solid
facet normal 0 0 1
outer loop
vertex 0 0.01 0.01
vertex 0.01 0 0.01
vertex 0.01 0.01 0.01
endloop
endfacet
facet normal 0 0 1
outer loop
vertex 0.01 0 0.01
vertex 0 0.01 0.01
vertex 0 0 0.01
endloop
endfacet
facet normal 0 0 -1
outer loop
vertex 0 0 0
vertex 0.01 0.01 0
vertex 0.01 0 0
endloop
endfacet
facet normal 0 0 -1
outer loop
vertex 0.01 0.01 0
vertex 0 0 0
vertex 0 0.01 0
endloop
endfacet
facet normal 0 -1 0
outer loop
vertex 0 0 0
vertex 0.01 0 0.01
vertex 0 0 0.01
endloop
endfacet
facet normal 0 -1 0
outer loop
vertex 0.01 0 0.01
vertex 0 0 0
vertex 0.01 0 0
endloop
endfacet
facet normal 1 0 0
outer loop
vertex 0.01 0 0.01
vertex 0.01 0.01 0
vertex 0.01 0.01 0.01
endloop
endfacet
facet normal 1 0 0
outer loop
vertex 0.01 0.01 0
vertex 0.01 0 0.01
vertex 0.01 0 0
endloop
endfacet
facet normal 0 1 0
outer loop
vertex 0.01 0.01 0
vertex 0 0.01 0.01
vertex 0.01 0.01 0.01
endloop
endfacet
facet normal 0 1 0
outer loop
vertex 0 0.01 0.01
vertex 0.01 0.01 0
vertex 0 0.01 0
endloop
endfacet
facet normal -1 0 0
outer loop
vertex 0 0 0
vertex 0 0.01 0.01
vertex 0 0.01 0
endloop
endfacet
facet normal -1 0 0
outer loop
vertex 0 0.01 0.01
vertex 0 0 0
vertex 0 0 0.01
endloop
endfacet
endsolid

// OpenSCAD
/***
 * @function superformula_shape_policy
 * @brief Preserve perimeter scaling and the fixed 720-sample solver-bound policy.
 * Source: [`superformula/shape_policy.scad`](superformula/shape_policy.scad)
 */
include <../../src/superformula/mate.scad>
for(n=[120,360,960],m=[4,6]) {
    scale=_cg_superformula_scale(.8,34,m,1,1,2.4,3.4,3.4,n);
    shape=_cg_superformula_shape(.8,34,m,1,1,2.4,3.4,3.4,n);
    mx=_cg_superformula_max_radius(scale,m,1,1,2.4,3.4,3.4,720);
    expected=_cg_superformula_points(scale,m,1,1,2.4,3.4,3.4,n);
    assert(max([for(i=[0:n-1]) _cg_vlen(_cg_vsub(shape[0][i],expected[i]))])<1e-10,"superformula polygon changed");
    assert(abs(shape[2]-(mx+.01))<1e-10 && abs(shape[3]-4*mx)<1e-10,"superformula bounds changed");
    assert(abs(curve_gear_superformula_centre_distance(.8,34,m,1,1,2.4,3.4,3.4,n)-_cg_superformula_centre_distance(scale,m,1,1,2.4,3.4,3.4,n))<1e-9);
}
cube(.01);
